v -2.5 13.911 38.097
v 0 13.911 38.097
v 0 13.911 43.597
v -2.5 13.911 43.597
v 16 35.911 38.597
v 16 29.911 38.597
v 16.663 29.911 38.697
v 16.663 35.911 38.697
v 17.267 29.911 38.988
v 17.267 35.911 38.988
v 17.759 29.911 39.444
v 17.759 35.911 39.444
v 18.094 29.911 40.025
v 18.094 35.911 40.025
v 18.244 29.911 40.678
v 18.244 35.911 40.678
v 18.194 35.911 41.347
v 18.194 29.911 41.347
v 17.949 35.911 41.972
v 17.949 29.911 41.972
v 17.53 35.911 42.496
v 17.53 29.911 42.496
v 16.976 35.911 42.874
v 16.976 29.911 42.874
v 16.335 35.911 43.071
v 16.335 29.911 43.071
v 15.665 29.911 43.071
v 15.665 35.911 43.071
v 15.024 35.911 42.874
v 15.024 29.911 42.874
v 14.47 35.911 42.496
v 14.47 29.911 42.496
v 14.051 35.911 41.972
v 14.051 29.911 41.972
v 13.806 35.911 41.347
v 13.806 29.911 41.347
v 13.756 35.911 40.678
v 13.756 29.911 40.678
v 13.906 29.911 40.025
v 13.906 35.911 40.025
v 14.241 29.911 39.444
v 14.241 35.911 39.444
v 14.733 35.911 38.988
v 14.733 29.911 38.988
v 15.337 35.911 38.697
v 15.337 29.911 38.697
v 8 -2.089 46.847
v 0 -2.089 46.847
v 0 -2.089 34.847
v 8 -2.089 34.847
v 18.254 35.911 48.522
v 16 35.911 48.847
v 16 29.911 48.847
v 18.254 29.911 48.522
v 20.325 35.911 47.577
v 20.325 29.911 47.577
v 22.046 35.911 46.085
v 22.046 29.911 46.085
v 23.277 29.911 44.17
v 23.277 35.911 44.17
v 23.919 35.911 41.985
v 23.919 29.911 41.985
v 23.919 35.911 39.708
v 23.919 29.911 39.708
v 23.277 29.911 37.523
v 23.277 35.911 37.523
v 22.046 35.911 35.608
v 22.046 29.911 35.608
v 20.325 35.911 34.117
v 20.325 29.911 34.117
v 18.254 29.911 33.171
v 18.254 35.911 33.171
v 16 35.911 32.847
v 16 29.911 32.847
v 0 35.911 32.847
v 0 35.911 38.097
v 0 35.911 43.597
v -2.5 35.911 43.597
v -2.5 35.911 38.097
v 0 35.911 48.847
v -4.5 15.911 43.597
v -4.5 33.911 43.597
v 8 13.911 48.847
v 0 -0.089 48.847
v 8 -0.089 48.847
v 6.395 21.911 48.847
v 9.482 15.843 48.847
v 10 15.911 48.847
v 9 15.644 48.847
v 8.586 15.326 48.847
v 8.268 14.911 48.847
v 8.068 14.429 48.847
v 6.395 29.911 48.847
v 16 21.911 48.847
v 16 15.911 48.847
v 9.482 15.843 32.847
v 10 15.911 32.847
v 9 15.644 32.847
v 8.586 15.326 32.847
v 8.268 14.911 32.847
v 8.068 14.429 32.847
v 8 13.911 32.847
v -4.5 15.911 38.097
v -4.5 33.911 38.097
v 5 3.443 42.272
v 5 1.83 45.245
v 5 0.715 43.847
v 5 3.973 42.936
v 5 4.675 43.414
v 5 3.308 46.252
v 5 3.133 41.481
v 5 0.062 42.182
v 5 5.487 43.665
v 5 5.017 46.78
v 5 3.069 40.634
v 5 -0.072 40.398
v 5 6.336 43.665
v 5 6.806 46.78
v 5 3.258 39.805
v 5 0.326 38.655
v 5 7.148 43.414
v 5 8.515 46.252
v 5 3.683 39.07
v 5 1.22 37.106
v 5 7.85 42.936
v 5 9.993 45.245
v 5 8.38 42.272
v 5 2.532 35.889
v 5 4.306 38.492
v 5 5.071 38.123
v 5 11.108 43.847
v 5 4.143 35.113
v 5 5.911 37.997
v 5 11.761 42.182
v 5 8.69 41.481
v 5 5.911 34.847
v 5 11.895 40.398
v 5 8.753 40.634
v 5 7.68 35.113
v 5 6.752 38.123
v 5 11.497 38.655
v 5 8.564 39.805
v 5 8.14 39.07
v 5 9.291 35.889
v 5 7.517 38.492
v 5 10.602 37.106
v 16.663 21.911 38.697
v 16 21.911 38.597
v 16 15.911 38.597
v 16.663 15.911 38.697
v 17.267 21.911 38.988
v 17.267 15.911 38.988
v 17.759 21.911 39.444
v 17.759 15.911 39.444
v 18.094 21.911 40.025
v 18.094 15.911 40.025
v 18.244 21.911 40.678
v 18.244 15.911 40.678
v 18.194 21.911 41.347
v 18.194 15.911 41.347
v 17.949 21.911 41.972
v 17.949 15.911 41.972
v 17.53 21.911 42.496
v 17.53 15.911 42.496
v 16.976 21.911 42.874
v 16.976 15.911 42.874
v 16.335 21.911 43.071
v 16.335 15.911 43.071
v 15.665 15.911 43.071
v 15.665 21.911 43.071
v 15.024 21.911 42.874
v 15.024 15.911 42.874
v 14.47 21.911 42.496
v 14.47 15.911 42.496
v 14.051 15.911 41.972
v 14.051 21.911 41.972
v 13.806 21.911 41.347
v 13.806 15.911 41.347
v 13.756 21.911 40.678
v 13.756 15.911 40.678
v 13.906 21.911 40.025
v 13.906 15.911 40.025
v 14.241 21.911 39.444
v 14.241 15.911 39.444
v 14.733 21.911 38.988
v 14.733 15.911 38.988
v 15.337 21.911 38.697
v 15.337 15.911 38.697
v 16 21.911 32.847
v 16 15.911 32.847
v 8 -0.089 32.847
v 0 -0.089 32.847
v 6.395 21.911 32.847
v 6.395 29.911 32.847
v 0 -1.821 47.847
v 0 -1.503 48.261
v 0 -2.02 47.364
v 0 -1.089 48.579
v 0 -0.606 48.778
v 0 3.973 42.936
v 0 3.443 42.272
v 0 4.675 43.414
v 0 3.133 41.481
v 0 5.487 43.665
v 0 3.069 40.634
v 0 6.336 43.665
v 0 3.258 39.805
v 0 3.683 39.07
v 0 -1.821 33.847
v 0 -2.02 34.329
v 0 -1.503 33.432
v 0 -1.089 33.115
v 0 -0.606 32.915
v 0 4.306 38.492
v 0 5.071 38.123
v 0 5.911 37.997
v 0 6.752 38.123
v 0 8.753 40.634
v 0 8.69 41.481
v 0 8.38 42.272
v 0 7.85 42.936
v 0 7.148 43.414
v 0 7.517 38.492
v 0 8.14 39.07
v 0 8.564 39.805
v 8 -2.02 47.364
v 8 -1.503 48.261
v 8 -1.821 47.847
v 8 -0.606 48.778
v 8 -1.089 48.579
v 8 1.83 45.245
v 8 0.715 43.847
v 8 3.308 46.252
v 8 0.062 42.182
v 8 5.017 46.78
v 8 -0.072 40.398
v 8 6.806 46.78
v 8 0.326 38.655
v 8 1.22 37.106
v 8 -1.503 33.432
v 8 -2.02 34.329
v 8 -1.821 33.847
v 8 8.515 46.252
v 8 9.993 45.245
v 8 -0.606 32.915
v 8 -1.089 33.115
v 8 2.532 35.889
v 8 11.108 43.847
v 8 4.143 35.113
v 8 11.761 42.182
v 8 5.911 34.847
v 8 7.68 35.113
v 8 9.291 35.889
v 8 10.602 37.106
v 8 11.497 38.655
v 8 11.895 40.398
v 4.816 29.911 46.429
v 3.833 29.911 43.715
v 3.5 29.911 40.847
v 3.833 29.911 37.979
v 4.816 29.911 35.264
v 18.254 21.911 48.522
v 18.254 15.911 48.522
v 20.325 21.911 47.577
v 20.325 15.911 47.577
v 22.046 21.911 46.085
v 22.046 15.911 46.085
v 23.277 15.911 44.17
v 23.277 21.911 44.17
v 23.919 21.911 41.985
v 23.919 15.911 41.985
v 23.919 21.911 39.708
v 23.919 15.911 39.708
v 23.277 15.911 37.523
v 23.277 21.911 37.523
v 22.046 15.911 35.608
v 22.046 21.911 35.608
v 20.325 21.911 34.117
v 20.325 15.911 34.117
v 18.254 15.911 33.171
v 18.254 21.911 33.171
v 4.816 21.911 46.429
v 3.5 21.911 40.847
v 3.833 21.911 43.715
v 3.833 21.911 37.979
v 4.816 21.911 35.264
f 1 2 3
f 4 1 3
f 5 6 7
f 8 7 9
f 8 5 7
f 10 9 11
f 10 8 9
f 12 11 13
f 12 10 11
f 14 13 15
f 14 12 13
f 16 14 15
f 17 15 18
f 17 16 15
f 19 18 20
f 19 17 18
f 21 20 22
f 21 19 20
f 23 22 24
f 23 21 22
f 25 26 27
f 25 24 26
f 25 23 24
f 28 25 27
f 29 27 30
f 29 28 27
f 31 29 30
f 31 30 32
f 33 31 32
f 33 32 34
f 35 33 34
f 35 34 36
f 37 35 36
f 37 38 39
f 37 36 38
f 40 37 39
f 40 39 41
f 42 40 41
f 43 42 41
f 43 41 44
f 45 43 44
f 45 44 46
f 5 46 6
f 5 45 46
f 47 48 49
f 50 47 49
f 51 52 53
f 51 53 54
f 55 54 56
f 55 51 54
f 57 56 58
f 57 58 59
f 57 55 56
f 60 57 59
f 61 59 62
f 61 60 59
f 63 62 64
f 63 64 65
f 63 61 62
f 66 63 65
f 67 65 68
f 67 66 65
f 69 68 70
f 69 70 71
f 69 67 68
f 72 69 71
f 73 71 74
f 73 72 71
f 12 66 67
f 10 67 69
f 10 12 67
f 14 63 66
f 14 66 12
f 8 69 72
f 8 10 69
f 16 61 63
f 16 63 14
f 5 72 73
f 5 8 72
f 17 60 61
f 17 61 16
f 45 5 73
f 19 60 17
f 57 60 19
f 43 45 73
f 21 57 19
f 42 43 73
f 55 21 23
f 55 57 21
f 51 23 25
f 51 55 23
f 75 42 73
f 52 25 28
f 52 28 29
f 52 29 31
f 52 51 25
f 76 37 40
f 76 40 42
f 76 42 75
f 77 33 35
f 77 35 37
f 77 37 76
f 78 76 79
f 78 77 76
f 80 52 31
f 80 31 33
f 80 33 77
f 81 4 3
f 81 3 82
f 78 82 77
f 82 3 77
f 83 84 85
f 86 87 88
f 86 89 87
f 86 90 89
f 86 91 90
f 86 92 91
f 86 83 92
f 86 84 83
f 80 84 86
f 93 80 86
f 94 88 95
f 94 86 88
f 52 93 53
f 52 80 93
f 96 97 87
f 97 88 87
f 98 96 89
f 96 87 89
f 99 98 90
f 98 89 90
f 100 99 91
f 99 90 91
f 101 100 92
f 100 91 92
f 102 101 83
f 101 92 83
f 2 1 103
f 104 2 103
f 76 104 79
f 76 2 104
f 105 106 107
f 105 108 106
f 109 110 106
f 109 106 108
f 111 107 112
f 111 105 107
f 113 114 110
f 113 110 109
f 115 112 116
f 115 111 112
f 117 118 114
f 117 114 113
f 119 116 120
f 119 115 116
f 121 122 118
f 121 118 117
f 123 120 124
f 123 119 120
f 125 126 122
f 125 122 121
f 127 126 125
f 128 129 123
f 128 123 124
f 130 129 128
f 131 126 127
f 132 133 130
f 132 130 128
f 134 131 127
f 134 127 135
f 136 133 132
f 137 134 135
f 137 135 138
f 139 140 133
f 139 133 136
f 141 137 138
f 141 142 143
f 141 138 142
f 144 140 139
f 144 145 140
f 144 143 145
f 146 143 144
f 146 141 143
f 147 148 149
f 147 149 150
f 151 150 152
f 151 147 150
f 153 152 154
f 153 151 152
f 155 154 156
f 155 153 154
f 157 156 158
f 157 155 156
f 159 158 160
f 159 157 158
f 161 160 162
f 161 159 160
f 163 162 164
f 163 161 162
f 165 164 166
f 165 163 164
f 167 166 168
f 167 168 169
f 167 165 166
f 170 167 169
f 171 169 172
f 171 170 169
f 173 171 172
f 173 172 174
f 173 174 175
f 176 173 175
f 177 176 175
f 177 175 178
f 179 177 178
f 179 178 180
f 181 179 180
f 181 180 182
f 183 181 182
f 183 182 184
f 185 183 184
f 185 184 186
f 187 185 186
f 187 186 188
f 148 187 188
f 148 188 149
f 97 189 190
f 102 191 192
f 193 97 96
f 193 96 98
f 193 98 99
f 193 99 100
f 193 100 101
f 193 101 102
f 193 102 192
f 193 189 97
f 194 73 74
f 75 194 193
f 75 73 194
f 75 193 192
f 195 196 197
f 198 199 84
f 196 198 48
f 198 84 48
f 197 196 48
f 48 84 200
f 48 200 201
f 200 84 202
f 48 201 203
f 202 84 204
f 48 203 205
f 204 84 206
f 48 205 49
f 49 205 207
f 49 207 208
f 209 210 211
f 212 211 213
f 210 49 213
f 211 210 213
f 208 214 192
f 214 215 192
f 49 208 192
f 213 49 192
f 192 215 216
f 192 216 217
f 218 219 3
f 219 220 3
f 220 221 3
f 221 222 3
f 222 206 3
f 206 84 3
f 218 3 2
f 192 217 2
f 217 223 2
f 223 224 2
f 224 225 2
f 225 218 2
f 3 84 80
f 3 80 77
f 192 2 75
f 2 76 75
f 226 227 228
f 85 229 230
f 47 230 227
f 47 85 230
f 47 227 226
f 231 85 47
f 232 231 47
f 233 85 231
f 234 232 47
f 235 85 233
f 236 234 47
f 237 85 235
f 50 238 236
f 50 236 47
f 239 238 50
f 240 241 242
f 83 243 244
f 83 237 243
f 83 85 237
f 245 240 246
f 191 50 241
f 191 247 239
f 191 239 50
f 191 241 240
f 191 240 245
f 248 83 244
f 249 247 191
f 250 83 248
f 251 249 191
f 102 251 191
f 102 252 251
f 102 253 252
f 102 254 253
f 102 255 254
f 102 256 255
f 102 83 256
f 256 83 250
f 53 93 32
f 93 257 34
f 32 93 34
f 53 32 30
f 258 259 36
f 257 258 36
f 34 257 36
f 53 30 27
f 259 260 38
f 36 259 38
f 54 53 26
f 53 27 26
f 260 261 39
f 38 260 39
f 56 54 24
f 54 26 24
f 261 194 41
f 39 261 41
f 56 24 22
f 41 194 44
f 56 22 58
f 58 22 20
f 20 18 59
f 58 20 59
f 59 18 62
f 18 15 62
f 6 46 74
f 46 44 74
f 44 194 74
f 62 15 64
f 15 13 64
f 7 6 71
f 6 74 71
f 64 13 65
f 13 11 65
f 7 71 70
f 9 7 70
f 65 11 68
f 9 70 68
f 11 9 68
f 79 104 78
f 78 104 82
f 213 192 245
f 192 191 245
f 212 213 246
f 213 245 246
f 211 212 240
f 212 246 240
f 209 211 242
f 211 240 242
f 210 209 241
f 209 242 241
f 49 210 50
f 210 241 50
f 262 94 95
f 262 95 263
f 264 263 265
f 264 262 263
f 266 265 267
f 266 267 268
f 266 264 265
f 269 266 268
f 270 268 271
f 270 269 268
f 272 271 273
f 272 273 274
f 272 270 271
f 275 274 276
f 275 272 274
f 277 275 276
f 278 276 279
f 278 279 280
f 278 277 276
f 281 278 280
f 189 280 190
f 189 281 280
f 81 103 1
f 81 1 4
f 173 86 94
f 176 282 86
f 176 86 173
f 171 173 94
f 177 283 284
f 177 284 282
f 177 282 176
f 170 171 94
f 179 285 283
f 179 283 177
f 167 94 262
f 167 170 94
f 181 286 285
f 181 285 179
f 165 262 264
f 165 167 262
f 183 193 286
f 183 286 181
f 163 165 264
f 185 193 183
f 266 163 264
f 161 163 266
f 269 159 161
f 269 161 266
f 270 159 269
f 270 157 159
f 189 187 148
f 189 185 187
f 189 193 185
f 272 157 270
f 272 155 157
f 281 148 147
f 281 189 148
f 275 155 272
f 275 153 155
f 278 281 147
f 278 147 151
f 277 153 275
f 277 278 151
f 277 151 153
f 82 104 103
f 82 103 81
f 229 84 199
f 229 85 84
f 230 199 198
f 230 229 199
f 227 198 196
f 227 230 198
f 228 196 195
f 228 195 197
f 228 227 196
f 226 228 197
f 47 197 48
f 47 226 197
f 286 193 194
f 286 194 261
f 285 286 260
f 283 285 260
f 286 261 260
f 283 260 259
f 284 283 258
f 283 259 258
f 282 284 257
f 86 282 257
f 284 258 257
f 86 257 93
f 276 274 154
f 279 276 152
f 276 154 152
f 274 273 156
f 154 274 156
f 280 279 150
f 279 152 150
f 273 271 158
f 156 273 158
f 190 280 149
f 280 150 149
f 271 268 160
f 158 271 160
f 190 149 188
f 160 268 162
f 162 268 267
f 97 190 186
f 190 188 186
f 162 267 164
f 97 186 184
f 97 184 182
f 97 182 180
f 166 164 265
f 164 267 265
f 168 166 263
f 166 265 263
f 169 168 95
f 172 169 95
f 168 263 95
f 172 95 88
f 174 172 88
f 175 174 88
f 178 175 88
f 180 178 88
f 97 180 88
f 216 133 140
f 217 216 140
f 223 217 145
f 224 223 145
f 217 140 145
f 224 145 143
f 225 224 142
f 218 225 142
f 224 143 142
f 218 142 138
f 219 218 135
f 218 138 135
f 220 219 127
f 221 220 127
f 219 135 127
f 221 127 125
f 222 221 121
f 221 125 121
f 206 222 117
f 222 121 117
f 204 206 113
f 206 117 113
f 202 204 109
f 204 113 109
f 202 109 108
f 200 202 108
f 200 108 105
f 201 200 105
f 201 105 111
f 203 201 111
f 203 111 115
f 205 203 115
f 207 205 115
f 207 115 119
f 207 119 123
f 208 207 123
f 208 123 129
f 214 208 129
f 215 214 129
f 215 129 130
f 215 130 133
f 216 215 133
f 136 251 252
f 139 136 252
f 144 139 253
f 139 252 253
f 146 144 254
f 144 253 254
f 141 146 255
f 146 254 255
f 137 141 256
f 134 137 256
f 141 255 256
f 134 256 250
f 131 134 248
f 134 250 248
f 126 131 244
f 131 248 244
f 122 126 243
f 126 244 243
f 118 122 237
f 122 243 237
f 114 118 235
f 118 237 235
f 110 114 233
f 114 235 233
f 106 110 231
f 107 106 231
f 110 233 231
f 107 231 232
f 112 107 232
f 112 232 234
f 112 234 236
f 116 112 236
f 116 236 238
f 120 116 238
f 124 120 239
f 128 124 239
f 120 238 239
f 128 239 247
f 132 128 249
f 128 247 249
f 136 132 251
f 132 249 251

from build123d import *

# Parameters (mm, degrees)
SKETCH1_W           = 16
SKETCH1_H           = 38
BOSS_EXTRUDE1_DEPTH = 8
SKETCH2_W           = 5.5
SKETCH2_H           = 22
BOSS_EXTRUDE2_DEPTH = 4.5
SKETCH6_R           = 2.25
BOSS_EXTRUDE3_DEPTH = 20
FILLET6_R           = 2
CHAMFER1_SIZE       = 2
SKETCH7_R           = 2.85
CUT_EXTRUDE1_DEPTH  = 10
SKETCH8_R           = 6
CUT_EXTRUDE2_DEPTH  = 3
CUT_EXTRUDE3_START  = -10
SKETCH9_R           = 12.5
CUT_EXTRUDE3_DEPTH  = 4
FILLET7_R           = 2


with BuildPart() as part:
    # Sketch1 → Boss-Extrude1 (new body)
    with BuildSketch(Plane(origin=(0, 0, 0), x_dir=(0, 0, -1), z_dir=(1, 0, 0))):
        with Locations((-40.846556001, 16.91146402)):
            Rectangle(SKETCH1_W, SKETCH1_H)
    extrude(amount=BOSS_EXTRUDE1_DEPTH)

    # Sketch2 → Boss-Extrude2 (add)
    with BuildSketch(Plane.ZY):
        with Locations((40.846556001, 24.91146402)):
            Rectangle(SKETCH2_W, SKETCH2_H)
    extrude(amount=BOSS_EXTRUDE2_DEPTH)

    # Sketch6 → Boss-Extrude3 (add)
    with BuildSketch(Plane.XZ.offset(-35.91146402)):
        with BuildLine():
            Line((8, 48.846556001), (16, 48.846556001))
            ThreePointArc((16, 48.846556001), (24, 40.846556001), (16, 32.846556001))
            Line((16, 32.846556001), (8, 32.846556001))
            Line((8, 32.846556001), (8, 48.846556001))
        make_face()
        with Locations(Location((16, 40.846556001, 0), (0, 0, 270))):
            Circle(SKETCH6_R, mode=Mode.SUBTRACT)
    extrude(amount=BOSS_EXTRUDE3_DEPTH)

    # Fillet6
    fillet6_edges = [part.edges().sort_by_distance(p)[0] for p in [
        (8, 15.91146402, 40.846556001),
    ]]
    fillet(fillet6_edges, radius=FILLET6_R)

    # Chamfer1
    chamfer1_edges = [part.edges().sort_by_distance(p)[0] for p in [
        (-4.5, 13.91146402, 40.846556001),
        (-4.5, 35.91146402, 40.846556001),
    ]]
    chamfer(chamfer1_edges, length=CHAMFER1_SIZE)

    # Sketch7 → Cut-Extrude1 (cut)
    with BuildSketch(Plane(origin=(8, 0, 0), x_dir=(0, 0, -1), z_dir=(1, 0, 0))):
        with Locations((-40.846556001, 5.91146402)):
            Circle(SKETCH7_R)
    extrude(amount=-CUT_EXTRUDE1_DEPTH, mode=Mode.SUBTRACT)

    # Sketch8 → Cut-Extrude2 (cut)
    with BuildSketch(Plane(origin=(8, 0, 0), x_dir=(0, 0, -1), z_dir=(1, 0, 0))):
        with Locations((-40.846556001, 5.91146402)):
            Circle(SKETCH8_R)
    extrude(amount=-CUT_EXTRUDE2_DEPTH, mode=Mode.SUBTRACT)

    # Sketch9 → Cut-Extrude3 (cut, symmetric)
    with BuildSketch(Plane(origin=(0, 35.91146402, 0), x_dir=(1, 0, 0), z_dir=(0, 1, 0)).offset(CUT_EXTRUDE3_START)):
        with Locations((16, -40.846556001)):
            Circle(SKETCH9_R)
    extrude(amount=CUT_EXTRUDE3_DEPTH, both=True, mode=Mode.SUBTRACT)

    # Fillet7
    fillet7_edges = [part.edges().sort_by_distance(p)[0] for p in [
        (4, -2.08853598, 32.846556001),
        (4, -2.08853598, 48.846556001),
    ]]
    fillet(fillet7_edges, radius=FILLET7_R)


solid = part.part
